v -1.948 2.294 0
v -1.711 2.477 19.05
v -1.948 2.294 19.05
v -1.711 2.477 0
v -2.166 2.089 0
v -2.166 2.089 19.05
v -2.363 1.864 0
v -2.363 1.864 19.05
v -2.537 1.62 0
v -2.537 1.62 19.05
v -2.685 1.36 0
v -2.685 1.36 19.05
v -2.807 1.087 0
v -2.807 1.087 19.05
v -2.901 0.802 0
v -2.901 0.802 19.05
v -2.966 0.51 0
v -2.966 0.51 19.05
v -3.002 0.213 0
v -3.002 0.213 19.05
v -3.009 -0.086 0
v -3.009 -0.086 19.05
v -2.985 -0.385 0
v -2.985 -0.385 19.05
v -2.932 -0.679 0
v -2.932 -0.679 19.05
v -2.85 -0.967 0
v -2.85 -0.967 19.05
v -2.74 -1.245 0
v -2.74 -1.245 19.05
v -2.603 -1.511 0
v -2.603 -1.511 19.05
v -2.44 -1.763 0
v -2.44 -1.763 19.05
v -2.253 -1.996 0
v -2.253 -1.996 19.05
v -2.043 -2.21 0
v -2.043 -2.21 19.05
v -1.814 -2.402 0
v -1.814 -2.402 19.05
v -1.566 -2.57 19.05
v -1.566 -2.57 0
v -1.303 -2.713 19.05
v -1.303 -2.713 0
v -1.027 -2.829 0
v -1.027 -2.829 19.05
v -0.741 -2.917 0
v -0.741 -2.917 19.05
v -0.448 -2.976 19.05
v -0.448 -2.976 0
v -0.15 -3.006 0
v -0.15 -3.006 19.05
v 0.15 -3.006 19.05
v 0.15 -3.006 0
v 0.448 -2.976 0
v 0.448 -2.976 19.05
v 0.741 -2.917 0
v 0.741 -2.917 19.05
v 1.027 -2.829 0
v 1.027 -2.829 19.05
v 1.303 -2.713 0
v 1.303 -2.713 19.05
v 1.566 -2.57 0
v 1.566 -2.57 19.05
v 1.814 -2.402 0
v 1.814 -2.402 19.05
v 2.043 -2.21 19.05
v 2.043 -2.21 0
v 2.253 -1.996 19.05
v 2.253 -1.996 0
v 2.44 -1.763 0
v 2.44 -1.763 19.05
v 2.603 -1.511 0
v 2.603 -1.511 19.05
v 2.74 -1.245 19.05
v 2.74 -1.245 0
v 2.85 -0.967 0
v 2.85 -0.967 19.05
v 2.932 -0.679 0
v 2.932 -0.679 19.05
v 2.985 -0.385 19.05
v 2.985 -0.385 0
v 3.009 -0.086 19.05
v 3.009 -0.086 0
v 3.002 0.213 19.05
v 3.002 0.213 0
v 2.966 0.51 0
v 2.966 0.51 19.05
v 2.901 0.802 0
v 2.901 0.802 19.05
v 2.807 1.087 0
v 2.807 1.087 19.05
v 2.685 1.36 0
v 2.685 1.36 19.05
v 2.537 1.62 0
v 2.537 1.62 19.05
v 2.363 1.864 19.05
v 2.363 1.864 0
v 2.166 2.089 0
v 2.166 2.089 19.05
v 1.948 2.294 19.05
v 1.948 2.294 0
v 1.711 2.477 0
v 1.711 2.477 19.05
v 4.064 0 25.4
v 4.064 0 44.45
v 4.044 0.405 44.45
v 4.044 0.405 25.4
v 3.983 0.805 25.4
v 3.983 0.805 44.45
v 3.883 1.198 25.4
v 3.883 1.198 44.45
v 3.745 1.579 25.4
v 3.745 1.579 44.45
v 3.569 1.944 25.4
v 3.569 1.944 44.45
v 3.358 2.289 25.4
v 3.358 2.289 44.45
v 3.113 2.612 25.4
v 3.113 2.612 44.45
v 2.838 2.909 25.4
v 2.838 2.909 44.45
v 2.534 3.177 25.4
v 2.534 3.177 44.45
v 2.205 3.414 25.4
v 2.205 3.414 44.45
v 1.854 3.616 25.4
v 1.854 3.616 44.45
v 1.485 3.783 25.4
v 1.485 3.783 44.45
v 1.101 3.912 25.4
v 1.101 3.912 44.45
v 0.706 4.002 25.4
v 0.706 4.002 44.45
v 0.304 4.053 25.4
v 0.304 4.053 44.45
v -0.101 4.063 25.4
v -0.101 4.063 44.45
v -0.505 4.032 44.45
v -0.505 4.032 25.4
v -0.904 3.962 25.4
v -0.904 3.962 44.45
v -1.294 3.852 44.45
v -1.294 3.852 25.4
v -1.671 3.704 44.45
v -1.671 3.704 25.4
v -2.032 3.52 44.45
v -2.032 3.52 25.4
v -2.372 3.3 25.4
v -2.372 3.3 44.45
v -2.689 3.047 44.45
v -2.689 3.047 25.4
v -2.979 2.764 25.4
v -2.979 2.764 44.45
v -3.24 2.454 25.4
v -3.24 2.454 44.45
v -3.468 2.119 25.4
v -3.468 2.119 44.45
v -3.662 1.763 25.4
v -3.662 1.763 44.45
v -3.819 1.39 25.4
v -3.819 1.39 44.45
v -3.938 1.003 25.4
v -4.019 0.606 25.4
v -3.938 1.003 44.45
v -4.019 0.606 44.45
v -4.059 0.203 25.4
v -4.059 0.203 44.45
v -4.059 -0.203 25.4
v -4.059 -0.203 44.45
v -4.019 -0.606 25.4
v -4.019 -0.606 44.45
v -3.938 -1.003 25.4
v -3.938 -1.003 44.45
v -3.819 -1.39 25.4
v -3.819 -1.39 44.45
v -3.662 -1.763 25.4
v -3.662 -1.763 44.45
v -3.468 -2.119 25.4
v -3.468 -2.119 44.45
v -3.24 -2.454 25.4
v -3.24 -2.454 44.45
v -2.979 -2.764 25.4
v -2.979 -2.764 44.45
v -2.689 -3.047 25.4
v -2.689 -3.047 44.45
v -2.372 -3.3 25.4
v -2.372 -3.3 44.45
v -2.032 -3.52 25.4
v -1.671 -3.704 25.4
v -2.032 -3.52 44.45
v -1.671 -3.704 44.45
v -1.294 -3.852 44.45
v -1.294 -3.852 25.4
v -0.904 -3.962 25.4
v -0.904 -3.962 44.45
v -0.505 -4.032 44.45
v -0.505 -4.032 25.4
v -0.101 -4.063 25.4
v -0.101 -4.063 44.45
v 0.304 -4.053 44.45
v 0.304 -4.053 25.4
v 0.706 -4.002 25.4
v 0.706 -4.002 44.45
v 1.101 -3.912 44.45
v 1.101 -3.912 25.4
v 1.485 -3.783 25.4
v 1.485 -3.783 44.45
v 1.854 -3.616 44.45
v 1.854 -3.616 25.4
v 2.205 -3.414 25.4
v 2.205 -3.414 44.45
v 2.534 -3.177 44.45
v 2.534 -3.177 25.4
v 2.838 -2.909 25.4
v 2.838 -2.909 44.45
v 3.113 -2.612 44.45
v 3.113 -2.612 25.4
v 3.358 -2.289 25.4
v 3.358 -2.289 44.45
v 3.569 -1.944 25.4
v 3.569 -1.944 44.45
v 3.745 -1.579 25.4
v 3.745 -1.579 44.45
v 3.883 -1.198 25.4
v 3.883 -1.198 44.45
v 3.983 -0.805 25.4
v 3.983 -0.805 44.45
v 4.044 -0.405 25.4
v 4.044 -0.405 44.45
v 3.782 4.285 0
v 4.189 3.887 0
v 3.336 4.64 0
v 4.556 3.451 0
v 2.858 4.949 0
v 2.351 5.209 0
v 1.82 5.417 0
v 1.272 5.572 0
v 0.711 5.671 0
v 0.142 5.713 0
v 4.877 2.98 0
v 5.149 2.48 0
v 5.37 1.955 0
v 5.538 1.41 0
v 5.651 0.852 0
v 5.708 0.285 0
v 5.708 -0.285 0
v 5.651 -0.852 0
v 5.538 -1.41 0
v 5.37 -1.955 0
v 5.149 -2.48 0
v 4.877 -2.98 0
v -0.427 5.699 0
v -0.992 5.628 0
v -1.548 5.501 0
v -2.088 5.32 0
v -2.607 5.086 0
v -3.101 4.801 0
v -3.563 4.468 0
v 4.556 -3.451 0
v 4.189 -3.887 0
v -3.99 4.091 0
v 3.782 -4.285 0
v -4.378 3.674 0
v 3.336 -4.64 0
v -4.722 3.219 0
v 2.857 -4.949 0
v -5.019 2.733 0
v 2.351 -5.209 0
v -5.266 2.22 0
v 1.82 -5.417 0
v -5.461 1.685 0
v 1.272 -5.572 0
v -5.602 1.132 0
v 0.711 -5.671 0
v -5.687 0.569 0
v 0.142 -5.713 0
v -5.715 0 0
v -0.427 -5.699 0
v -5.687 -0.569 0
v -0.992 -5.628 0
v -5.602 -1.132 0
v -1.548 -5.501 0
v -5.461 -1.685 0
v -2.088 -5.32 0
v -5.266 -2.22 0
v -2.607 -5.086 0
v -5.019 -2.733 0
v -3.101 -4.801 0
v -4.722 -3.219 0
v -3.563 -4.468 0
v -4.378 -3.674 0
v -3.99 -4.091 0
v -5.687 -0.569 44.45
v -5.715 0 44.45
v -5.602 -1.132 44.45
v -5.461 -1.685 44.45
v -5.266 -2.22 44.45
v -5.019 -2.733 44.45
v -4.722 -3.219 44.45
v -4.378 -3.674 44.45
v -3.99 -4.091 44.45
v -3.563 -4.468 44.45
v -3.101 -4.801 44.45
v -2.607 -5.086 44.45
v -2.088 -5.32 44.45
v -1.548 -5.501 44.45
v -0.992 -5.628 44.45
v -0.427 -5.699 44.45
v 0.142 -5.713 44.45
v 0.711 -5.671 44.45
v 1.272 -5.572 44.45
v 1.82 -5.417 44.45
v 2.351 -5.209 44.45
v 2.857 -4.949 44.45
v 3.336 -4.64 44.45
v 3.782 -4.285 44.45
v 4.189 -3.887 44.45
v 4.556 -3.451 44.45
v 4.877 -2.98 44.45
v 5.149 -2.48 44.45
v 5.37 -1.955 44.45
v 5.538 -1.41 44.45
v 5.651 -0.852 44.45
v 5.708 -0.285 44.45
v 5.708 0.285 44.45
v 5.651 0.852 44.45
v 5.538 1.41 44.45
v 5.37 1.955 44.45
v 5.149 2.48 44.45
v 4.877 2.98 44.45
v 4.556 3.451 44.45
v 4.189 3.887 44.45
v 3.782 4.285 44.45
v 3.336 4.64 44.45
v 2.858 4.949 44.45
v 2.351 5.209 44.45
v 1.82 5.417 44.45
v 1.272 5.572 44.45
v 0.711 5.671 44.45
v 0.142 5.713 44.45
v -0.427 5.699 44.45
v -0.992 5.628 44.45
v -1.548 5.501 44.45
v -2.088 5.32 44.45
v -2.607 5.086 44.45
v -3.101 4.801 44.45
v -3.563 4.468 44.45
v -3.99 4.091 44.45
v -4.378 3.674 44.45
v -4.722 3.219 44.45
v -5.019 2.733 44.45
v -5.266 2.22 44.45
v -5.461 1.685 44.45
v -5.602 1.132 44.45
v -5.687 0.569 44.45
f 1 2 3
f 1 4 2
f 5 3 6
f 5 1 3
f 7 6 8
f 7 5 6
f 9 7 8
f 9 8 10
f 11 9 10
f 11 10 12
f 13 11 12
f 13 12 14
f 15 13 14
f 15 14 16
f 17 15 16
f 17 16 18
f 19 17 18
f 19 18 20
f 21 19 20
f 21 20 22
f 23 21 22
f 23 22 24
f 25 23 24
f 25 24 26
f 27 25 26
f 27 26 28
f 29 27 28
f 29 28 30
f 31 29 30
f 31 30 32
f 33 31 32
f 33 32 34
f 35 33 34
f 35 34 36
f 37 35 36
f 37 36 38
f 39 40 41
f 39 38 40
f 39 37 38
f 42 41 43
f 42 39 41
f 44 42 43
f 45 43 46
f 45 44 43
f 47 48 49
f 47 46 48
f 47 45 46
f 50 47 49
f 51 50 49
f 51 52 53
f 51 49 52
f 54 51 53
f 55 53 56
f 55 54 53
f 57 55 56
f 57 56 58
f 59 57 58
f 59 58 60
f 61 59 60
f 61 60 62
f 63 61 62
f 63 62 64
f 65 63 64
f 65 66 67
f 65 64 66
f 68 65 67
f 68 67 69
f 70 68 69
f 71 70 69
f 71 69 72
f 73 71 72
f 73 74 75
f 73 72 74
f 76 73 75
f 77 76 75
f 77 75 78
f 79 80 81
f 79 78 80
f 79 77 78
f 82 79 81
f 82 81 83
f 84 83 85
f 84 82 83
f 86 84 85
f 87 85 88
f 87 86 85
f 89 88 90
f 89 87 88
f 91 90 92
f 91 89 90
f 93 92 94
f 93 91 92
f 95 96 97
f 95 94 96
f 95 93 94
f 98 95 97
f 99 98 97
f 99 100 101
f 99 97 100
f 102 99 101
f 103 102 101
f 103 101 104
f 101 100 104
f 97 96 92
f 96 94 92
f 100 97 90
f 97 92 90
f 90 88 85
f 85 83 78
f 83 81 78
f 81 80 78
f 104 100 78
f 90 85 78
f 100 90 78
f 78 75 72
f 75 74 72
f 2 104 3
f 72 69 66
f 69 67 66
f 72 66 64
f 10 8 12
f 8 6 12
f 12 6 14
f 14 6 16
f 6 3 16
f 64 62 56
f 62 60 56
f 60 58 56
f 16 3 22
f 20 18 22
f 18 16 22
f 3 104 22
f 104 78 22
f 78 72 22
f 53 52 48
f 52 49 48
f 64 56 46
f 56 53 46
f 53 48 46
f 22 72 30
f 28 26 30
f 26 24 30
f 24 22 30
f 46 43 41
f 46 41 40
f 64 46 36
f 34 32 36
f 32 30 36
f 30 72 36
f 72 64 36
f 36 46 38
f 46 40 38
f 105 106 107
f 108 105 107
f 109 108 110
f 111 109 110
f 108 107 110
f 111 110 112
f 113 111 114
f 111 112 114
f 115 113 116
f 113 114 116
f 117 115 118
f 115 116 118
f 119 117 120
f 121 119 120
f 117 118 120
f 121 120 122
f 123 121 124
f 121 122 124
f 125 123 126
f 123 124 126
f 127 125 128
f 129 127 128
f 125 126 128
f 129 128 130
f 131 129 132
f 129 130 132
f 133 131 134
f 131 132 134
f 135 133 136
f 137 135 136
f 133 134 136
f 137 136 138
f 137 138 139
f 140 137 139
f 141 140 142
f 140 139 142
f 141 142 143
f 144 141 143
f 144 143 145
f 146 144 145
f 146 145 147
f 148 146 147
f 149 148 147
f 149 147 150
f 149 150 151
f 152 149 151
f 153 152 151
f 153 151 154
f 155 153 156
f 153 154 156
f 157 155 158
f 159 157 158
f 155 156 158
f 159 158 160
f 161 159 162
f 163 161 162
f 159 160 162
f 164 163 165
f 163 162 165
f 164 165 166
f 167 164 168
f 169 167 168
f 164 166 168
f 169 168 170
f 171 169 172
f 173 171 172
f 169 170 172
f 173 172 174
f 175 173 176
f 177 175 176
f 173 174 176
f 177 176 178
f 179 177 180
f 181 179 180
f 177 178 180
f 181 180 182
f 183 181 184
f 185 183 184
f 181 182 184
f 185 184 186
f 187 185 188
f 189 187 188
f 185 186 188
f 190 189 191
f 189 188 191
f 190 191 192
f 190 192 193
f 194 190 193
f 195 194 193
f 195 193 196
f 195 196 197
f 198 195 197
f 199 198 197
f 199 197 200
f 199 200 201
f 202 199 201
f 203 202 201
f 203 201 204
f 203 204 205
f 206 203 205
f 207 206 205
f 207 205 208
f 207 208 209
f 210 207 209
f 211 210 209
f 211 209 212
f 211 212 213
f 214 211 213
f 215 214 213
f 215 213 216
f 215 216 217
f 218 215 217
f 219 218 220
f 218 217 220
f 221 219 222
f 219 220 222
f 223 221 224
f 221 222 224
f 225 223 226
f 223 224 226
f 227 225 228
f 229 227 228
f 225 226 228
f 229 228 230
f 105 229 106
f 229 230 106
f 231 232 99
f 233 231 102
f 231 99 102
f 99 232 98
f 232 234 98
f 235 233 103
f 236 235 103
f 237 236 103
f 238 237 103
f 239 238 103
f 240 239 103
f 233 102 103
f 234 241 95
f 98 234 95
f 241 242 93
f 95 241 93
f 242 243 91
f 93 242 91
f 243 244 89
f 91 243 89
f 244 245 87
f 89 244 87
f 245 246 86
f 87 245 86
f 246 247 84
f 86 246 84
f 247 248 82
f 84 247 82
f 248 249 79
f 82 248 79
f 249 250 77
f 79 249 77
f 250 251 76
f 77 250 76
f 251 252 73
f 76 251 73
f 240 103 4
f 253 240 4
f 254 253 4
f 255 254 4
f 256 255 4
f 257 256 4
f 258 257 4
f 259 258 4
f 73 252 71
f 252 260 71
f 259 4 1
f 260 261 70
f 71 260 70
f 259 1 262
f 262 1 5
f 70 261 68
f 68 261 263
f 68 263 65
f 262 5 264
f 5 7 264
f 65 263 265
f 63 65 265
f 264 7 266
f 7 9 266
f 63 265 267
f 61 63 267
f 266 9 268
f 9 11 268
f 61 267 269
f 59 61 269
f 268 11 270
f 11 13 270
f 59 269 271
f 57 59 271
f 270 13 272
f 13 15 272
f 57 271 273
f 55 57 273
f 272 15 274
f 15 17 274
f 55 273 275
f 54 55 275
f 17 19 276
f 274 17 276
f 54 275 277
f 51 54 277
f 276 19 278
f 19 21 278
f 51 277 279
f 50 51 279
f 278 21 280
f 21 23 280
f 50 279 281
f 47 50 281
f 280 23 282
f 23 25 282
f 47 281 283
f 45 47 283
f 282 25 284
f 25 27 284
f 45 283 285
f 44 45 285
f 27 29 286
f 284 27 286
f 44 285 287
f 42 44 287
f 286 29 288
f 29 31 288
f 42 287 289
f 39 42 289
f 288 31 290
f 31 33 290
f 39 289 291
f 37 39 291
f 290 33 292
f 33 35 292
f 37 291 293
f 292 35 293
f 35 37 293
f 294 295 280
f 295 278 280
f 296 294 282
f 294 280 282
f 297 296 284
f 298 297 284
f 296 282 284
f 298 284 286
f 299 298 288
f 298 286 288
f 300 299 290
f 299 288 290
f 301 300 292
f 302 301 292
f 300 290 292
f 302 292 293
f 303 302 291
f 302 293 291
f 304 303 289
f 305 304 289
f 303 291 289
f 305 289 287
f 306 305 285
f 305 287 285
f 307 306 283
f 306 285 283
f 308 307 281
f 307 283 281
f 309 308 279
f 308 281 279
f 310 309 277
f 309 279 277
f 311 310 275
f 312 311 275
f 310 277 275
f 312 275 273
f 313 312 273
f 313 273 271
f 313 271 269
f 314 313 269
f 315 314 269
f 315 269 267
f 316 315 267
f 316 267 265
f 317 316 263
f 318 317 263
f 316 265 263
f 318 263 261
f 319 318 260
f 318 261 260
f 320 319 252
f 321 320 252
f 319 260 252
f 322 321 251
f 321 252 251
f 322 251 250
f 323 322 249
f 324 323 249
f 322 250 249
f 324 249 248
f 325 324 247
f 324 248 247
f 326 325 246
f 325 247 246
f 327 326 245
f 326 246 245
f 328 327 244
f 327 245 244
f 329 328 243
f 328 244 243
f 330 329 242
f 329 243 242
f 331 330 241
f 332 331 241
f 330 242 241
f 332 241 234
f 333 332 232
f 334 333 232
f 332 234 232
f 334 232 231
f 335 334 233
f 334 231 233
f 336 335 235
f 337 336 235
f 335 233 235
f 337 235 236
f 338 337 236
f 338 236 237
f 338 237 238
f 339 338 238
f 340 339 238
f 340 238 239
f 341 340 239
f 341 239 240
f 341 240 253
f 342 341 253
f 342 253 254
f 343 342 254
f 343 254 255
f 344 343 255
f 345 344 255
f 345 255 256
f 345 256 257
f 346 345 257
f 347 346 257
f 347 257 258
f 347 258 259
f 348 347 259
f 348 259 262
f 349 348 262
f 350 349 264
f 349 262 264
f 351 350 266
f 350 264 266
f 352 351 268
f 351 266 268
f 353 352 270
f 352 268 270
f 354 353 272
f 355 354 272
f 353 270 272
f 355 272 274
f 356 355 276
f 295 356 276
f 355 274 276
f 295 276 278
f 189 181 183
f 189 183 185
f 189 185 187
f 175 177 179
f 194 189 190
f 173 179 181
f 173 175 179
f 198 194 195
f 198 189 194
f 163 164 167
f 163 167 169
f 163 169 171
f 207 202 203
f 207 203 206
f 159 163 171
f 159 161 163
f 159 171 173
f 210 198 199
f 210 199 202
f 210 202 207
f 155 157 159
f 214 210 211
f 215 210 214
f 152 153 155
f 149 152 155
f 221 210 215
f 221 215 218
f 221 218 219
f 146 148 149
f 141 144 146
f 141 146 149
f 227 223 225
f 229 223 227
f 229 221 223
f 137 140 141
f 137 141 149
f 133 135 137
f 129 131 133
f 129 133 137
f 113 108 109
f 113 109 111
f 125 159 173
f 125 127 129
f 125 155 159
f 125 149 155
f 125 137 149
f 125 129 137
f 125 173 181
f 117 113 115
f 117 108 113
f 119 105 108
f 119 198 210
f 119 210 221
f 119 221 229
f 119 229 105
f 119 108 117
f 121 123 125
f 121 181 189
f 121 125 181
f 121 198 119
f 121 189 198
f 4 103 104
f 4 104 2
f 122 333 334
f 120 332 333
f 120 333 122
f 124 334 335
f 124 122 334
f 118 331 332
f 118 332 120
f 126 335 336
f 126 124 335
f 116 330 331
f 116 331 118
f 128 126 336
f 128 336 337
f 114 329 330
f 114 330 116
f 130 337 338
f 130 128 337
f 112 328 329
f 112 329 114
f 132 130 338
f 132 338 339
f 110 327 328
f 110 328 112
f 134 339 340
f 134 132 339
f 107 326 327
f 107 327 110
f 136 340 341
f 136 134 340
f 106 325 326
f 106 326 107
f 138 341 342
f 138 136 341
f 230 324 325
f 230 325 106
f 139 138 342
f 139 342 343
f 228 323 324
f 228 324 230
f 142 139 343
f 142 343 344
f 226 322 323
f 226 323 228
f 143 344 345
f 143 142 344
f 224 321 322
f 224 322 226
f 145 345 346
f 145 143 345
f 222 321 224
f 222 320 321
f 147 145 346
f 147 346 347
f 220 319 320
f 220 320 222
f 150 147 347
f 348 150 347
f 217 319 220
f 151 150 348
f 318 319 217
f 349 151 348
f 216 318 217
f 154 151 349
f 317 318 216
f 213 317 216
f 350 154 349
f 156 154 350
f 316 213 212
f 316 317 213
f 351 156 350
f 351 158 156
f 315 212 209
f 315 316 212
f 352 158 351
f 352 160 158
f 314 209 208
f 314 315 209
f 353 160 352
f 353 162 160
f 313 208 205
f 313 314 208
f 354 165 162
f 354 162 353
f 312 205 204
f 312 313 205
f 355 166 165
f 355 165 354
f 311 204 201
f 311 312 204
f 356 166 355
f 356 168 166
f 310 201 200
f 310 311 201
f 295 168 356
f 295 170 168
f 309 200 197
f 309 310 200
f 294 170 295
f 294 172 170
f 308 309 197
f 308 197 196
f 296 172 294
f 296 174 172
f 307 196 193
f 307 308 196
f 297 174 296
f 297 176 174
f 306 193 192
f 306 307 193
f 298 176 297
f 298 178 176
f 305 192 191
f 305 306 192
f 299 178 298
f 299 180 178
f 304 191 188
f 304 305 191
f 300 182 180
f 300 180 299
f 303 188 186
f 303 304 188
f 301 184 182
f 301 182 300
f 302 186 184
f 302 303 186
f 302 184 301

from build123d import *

# Parameters (mm, degrees)
SKETCH2_R           = 5.715
BOSS_EXTRUDE1_DEPTH = 19.05
CUT_EXTRUDE1_DEPTH  = 21.693596836
SKETCH9_R           = 5.715
BOSS_EXTRUDE5_DEPTH = 12.7
SKETCH10_R          = 5.715
BOSS_EXTRUDE6_DEPTH = 12.7
SKETCH11_R          = 4.064
CUT_EXTRUDE2_DEPTH  = 19.05


with BuildPart() as part:
    # Sketch2 → Boss-Extrude1 (new body)
    with BuildSketch(Plane.XY):
        with Locations(Location((0, 0, 0), (0, 0, 180))):
            Circle(SKETCH2_R)
    extrude(amount=BOSS_EXTRUDE1_DEPTH)

    # Sketch3 → Cut-Extrude1 (cut, through all)
    with BuildSketch(Plane(origin=(0, 0, 0), x_dir=(-1, 0, 0), z_dir=(0, 0, -1))):
        with BuildLine():
            Line((-1.710685757, 2.4765), (1.710685757, 2.4765))
            ThreePointArc((1.710685757, 2.4765), (0, -3.0099), (-1.710685757, 2.4765))
        make_face()
    extrude(amount=-CUT_EXTRUDE1_DEPTH, mode=Mode.SUBTRACT)

    # Sketch9 → Boss-Extrude5 (add)
    with BuildSketch(Plane.XY.offset(19.05)):
        with Locations(Location((0, 0, 0), (0, 0, 180))):
            Circle(SKETCH9_R)
    extrude(amount=BOSS_EXTRUDE5_DEPTH)

    # Sketch10 → Boss-Extrude6 (add)
    with BuildSketch(Plane.XY.offset(31.75)):
        with Locations(Location((0, 0, 0), (0, 0, 180))):
            Circle(SKETCH10_R)
    extrude(amount=BOSS_EXTRUDE6_DEPTH)

    # Sketch11 → Cut-Extrude2 (cut)
    with BuildSketch(Plane.XY.offset(44.45)):
        Circle(SKETCH11_R)
    extrude(amount=-CUT_EXTRUDE2_DEPTH, mode=Mode.SUBTRACT)


solid = part.part
